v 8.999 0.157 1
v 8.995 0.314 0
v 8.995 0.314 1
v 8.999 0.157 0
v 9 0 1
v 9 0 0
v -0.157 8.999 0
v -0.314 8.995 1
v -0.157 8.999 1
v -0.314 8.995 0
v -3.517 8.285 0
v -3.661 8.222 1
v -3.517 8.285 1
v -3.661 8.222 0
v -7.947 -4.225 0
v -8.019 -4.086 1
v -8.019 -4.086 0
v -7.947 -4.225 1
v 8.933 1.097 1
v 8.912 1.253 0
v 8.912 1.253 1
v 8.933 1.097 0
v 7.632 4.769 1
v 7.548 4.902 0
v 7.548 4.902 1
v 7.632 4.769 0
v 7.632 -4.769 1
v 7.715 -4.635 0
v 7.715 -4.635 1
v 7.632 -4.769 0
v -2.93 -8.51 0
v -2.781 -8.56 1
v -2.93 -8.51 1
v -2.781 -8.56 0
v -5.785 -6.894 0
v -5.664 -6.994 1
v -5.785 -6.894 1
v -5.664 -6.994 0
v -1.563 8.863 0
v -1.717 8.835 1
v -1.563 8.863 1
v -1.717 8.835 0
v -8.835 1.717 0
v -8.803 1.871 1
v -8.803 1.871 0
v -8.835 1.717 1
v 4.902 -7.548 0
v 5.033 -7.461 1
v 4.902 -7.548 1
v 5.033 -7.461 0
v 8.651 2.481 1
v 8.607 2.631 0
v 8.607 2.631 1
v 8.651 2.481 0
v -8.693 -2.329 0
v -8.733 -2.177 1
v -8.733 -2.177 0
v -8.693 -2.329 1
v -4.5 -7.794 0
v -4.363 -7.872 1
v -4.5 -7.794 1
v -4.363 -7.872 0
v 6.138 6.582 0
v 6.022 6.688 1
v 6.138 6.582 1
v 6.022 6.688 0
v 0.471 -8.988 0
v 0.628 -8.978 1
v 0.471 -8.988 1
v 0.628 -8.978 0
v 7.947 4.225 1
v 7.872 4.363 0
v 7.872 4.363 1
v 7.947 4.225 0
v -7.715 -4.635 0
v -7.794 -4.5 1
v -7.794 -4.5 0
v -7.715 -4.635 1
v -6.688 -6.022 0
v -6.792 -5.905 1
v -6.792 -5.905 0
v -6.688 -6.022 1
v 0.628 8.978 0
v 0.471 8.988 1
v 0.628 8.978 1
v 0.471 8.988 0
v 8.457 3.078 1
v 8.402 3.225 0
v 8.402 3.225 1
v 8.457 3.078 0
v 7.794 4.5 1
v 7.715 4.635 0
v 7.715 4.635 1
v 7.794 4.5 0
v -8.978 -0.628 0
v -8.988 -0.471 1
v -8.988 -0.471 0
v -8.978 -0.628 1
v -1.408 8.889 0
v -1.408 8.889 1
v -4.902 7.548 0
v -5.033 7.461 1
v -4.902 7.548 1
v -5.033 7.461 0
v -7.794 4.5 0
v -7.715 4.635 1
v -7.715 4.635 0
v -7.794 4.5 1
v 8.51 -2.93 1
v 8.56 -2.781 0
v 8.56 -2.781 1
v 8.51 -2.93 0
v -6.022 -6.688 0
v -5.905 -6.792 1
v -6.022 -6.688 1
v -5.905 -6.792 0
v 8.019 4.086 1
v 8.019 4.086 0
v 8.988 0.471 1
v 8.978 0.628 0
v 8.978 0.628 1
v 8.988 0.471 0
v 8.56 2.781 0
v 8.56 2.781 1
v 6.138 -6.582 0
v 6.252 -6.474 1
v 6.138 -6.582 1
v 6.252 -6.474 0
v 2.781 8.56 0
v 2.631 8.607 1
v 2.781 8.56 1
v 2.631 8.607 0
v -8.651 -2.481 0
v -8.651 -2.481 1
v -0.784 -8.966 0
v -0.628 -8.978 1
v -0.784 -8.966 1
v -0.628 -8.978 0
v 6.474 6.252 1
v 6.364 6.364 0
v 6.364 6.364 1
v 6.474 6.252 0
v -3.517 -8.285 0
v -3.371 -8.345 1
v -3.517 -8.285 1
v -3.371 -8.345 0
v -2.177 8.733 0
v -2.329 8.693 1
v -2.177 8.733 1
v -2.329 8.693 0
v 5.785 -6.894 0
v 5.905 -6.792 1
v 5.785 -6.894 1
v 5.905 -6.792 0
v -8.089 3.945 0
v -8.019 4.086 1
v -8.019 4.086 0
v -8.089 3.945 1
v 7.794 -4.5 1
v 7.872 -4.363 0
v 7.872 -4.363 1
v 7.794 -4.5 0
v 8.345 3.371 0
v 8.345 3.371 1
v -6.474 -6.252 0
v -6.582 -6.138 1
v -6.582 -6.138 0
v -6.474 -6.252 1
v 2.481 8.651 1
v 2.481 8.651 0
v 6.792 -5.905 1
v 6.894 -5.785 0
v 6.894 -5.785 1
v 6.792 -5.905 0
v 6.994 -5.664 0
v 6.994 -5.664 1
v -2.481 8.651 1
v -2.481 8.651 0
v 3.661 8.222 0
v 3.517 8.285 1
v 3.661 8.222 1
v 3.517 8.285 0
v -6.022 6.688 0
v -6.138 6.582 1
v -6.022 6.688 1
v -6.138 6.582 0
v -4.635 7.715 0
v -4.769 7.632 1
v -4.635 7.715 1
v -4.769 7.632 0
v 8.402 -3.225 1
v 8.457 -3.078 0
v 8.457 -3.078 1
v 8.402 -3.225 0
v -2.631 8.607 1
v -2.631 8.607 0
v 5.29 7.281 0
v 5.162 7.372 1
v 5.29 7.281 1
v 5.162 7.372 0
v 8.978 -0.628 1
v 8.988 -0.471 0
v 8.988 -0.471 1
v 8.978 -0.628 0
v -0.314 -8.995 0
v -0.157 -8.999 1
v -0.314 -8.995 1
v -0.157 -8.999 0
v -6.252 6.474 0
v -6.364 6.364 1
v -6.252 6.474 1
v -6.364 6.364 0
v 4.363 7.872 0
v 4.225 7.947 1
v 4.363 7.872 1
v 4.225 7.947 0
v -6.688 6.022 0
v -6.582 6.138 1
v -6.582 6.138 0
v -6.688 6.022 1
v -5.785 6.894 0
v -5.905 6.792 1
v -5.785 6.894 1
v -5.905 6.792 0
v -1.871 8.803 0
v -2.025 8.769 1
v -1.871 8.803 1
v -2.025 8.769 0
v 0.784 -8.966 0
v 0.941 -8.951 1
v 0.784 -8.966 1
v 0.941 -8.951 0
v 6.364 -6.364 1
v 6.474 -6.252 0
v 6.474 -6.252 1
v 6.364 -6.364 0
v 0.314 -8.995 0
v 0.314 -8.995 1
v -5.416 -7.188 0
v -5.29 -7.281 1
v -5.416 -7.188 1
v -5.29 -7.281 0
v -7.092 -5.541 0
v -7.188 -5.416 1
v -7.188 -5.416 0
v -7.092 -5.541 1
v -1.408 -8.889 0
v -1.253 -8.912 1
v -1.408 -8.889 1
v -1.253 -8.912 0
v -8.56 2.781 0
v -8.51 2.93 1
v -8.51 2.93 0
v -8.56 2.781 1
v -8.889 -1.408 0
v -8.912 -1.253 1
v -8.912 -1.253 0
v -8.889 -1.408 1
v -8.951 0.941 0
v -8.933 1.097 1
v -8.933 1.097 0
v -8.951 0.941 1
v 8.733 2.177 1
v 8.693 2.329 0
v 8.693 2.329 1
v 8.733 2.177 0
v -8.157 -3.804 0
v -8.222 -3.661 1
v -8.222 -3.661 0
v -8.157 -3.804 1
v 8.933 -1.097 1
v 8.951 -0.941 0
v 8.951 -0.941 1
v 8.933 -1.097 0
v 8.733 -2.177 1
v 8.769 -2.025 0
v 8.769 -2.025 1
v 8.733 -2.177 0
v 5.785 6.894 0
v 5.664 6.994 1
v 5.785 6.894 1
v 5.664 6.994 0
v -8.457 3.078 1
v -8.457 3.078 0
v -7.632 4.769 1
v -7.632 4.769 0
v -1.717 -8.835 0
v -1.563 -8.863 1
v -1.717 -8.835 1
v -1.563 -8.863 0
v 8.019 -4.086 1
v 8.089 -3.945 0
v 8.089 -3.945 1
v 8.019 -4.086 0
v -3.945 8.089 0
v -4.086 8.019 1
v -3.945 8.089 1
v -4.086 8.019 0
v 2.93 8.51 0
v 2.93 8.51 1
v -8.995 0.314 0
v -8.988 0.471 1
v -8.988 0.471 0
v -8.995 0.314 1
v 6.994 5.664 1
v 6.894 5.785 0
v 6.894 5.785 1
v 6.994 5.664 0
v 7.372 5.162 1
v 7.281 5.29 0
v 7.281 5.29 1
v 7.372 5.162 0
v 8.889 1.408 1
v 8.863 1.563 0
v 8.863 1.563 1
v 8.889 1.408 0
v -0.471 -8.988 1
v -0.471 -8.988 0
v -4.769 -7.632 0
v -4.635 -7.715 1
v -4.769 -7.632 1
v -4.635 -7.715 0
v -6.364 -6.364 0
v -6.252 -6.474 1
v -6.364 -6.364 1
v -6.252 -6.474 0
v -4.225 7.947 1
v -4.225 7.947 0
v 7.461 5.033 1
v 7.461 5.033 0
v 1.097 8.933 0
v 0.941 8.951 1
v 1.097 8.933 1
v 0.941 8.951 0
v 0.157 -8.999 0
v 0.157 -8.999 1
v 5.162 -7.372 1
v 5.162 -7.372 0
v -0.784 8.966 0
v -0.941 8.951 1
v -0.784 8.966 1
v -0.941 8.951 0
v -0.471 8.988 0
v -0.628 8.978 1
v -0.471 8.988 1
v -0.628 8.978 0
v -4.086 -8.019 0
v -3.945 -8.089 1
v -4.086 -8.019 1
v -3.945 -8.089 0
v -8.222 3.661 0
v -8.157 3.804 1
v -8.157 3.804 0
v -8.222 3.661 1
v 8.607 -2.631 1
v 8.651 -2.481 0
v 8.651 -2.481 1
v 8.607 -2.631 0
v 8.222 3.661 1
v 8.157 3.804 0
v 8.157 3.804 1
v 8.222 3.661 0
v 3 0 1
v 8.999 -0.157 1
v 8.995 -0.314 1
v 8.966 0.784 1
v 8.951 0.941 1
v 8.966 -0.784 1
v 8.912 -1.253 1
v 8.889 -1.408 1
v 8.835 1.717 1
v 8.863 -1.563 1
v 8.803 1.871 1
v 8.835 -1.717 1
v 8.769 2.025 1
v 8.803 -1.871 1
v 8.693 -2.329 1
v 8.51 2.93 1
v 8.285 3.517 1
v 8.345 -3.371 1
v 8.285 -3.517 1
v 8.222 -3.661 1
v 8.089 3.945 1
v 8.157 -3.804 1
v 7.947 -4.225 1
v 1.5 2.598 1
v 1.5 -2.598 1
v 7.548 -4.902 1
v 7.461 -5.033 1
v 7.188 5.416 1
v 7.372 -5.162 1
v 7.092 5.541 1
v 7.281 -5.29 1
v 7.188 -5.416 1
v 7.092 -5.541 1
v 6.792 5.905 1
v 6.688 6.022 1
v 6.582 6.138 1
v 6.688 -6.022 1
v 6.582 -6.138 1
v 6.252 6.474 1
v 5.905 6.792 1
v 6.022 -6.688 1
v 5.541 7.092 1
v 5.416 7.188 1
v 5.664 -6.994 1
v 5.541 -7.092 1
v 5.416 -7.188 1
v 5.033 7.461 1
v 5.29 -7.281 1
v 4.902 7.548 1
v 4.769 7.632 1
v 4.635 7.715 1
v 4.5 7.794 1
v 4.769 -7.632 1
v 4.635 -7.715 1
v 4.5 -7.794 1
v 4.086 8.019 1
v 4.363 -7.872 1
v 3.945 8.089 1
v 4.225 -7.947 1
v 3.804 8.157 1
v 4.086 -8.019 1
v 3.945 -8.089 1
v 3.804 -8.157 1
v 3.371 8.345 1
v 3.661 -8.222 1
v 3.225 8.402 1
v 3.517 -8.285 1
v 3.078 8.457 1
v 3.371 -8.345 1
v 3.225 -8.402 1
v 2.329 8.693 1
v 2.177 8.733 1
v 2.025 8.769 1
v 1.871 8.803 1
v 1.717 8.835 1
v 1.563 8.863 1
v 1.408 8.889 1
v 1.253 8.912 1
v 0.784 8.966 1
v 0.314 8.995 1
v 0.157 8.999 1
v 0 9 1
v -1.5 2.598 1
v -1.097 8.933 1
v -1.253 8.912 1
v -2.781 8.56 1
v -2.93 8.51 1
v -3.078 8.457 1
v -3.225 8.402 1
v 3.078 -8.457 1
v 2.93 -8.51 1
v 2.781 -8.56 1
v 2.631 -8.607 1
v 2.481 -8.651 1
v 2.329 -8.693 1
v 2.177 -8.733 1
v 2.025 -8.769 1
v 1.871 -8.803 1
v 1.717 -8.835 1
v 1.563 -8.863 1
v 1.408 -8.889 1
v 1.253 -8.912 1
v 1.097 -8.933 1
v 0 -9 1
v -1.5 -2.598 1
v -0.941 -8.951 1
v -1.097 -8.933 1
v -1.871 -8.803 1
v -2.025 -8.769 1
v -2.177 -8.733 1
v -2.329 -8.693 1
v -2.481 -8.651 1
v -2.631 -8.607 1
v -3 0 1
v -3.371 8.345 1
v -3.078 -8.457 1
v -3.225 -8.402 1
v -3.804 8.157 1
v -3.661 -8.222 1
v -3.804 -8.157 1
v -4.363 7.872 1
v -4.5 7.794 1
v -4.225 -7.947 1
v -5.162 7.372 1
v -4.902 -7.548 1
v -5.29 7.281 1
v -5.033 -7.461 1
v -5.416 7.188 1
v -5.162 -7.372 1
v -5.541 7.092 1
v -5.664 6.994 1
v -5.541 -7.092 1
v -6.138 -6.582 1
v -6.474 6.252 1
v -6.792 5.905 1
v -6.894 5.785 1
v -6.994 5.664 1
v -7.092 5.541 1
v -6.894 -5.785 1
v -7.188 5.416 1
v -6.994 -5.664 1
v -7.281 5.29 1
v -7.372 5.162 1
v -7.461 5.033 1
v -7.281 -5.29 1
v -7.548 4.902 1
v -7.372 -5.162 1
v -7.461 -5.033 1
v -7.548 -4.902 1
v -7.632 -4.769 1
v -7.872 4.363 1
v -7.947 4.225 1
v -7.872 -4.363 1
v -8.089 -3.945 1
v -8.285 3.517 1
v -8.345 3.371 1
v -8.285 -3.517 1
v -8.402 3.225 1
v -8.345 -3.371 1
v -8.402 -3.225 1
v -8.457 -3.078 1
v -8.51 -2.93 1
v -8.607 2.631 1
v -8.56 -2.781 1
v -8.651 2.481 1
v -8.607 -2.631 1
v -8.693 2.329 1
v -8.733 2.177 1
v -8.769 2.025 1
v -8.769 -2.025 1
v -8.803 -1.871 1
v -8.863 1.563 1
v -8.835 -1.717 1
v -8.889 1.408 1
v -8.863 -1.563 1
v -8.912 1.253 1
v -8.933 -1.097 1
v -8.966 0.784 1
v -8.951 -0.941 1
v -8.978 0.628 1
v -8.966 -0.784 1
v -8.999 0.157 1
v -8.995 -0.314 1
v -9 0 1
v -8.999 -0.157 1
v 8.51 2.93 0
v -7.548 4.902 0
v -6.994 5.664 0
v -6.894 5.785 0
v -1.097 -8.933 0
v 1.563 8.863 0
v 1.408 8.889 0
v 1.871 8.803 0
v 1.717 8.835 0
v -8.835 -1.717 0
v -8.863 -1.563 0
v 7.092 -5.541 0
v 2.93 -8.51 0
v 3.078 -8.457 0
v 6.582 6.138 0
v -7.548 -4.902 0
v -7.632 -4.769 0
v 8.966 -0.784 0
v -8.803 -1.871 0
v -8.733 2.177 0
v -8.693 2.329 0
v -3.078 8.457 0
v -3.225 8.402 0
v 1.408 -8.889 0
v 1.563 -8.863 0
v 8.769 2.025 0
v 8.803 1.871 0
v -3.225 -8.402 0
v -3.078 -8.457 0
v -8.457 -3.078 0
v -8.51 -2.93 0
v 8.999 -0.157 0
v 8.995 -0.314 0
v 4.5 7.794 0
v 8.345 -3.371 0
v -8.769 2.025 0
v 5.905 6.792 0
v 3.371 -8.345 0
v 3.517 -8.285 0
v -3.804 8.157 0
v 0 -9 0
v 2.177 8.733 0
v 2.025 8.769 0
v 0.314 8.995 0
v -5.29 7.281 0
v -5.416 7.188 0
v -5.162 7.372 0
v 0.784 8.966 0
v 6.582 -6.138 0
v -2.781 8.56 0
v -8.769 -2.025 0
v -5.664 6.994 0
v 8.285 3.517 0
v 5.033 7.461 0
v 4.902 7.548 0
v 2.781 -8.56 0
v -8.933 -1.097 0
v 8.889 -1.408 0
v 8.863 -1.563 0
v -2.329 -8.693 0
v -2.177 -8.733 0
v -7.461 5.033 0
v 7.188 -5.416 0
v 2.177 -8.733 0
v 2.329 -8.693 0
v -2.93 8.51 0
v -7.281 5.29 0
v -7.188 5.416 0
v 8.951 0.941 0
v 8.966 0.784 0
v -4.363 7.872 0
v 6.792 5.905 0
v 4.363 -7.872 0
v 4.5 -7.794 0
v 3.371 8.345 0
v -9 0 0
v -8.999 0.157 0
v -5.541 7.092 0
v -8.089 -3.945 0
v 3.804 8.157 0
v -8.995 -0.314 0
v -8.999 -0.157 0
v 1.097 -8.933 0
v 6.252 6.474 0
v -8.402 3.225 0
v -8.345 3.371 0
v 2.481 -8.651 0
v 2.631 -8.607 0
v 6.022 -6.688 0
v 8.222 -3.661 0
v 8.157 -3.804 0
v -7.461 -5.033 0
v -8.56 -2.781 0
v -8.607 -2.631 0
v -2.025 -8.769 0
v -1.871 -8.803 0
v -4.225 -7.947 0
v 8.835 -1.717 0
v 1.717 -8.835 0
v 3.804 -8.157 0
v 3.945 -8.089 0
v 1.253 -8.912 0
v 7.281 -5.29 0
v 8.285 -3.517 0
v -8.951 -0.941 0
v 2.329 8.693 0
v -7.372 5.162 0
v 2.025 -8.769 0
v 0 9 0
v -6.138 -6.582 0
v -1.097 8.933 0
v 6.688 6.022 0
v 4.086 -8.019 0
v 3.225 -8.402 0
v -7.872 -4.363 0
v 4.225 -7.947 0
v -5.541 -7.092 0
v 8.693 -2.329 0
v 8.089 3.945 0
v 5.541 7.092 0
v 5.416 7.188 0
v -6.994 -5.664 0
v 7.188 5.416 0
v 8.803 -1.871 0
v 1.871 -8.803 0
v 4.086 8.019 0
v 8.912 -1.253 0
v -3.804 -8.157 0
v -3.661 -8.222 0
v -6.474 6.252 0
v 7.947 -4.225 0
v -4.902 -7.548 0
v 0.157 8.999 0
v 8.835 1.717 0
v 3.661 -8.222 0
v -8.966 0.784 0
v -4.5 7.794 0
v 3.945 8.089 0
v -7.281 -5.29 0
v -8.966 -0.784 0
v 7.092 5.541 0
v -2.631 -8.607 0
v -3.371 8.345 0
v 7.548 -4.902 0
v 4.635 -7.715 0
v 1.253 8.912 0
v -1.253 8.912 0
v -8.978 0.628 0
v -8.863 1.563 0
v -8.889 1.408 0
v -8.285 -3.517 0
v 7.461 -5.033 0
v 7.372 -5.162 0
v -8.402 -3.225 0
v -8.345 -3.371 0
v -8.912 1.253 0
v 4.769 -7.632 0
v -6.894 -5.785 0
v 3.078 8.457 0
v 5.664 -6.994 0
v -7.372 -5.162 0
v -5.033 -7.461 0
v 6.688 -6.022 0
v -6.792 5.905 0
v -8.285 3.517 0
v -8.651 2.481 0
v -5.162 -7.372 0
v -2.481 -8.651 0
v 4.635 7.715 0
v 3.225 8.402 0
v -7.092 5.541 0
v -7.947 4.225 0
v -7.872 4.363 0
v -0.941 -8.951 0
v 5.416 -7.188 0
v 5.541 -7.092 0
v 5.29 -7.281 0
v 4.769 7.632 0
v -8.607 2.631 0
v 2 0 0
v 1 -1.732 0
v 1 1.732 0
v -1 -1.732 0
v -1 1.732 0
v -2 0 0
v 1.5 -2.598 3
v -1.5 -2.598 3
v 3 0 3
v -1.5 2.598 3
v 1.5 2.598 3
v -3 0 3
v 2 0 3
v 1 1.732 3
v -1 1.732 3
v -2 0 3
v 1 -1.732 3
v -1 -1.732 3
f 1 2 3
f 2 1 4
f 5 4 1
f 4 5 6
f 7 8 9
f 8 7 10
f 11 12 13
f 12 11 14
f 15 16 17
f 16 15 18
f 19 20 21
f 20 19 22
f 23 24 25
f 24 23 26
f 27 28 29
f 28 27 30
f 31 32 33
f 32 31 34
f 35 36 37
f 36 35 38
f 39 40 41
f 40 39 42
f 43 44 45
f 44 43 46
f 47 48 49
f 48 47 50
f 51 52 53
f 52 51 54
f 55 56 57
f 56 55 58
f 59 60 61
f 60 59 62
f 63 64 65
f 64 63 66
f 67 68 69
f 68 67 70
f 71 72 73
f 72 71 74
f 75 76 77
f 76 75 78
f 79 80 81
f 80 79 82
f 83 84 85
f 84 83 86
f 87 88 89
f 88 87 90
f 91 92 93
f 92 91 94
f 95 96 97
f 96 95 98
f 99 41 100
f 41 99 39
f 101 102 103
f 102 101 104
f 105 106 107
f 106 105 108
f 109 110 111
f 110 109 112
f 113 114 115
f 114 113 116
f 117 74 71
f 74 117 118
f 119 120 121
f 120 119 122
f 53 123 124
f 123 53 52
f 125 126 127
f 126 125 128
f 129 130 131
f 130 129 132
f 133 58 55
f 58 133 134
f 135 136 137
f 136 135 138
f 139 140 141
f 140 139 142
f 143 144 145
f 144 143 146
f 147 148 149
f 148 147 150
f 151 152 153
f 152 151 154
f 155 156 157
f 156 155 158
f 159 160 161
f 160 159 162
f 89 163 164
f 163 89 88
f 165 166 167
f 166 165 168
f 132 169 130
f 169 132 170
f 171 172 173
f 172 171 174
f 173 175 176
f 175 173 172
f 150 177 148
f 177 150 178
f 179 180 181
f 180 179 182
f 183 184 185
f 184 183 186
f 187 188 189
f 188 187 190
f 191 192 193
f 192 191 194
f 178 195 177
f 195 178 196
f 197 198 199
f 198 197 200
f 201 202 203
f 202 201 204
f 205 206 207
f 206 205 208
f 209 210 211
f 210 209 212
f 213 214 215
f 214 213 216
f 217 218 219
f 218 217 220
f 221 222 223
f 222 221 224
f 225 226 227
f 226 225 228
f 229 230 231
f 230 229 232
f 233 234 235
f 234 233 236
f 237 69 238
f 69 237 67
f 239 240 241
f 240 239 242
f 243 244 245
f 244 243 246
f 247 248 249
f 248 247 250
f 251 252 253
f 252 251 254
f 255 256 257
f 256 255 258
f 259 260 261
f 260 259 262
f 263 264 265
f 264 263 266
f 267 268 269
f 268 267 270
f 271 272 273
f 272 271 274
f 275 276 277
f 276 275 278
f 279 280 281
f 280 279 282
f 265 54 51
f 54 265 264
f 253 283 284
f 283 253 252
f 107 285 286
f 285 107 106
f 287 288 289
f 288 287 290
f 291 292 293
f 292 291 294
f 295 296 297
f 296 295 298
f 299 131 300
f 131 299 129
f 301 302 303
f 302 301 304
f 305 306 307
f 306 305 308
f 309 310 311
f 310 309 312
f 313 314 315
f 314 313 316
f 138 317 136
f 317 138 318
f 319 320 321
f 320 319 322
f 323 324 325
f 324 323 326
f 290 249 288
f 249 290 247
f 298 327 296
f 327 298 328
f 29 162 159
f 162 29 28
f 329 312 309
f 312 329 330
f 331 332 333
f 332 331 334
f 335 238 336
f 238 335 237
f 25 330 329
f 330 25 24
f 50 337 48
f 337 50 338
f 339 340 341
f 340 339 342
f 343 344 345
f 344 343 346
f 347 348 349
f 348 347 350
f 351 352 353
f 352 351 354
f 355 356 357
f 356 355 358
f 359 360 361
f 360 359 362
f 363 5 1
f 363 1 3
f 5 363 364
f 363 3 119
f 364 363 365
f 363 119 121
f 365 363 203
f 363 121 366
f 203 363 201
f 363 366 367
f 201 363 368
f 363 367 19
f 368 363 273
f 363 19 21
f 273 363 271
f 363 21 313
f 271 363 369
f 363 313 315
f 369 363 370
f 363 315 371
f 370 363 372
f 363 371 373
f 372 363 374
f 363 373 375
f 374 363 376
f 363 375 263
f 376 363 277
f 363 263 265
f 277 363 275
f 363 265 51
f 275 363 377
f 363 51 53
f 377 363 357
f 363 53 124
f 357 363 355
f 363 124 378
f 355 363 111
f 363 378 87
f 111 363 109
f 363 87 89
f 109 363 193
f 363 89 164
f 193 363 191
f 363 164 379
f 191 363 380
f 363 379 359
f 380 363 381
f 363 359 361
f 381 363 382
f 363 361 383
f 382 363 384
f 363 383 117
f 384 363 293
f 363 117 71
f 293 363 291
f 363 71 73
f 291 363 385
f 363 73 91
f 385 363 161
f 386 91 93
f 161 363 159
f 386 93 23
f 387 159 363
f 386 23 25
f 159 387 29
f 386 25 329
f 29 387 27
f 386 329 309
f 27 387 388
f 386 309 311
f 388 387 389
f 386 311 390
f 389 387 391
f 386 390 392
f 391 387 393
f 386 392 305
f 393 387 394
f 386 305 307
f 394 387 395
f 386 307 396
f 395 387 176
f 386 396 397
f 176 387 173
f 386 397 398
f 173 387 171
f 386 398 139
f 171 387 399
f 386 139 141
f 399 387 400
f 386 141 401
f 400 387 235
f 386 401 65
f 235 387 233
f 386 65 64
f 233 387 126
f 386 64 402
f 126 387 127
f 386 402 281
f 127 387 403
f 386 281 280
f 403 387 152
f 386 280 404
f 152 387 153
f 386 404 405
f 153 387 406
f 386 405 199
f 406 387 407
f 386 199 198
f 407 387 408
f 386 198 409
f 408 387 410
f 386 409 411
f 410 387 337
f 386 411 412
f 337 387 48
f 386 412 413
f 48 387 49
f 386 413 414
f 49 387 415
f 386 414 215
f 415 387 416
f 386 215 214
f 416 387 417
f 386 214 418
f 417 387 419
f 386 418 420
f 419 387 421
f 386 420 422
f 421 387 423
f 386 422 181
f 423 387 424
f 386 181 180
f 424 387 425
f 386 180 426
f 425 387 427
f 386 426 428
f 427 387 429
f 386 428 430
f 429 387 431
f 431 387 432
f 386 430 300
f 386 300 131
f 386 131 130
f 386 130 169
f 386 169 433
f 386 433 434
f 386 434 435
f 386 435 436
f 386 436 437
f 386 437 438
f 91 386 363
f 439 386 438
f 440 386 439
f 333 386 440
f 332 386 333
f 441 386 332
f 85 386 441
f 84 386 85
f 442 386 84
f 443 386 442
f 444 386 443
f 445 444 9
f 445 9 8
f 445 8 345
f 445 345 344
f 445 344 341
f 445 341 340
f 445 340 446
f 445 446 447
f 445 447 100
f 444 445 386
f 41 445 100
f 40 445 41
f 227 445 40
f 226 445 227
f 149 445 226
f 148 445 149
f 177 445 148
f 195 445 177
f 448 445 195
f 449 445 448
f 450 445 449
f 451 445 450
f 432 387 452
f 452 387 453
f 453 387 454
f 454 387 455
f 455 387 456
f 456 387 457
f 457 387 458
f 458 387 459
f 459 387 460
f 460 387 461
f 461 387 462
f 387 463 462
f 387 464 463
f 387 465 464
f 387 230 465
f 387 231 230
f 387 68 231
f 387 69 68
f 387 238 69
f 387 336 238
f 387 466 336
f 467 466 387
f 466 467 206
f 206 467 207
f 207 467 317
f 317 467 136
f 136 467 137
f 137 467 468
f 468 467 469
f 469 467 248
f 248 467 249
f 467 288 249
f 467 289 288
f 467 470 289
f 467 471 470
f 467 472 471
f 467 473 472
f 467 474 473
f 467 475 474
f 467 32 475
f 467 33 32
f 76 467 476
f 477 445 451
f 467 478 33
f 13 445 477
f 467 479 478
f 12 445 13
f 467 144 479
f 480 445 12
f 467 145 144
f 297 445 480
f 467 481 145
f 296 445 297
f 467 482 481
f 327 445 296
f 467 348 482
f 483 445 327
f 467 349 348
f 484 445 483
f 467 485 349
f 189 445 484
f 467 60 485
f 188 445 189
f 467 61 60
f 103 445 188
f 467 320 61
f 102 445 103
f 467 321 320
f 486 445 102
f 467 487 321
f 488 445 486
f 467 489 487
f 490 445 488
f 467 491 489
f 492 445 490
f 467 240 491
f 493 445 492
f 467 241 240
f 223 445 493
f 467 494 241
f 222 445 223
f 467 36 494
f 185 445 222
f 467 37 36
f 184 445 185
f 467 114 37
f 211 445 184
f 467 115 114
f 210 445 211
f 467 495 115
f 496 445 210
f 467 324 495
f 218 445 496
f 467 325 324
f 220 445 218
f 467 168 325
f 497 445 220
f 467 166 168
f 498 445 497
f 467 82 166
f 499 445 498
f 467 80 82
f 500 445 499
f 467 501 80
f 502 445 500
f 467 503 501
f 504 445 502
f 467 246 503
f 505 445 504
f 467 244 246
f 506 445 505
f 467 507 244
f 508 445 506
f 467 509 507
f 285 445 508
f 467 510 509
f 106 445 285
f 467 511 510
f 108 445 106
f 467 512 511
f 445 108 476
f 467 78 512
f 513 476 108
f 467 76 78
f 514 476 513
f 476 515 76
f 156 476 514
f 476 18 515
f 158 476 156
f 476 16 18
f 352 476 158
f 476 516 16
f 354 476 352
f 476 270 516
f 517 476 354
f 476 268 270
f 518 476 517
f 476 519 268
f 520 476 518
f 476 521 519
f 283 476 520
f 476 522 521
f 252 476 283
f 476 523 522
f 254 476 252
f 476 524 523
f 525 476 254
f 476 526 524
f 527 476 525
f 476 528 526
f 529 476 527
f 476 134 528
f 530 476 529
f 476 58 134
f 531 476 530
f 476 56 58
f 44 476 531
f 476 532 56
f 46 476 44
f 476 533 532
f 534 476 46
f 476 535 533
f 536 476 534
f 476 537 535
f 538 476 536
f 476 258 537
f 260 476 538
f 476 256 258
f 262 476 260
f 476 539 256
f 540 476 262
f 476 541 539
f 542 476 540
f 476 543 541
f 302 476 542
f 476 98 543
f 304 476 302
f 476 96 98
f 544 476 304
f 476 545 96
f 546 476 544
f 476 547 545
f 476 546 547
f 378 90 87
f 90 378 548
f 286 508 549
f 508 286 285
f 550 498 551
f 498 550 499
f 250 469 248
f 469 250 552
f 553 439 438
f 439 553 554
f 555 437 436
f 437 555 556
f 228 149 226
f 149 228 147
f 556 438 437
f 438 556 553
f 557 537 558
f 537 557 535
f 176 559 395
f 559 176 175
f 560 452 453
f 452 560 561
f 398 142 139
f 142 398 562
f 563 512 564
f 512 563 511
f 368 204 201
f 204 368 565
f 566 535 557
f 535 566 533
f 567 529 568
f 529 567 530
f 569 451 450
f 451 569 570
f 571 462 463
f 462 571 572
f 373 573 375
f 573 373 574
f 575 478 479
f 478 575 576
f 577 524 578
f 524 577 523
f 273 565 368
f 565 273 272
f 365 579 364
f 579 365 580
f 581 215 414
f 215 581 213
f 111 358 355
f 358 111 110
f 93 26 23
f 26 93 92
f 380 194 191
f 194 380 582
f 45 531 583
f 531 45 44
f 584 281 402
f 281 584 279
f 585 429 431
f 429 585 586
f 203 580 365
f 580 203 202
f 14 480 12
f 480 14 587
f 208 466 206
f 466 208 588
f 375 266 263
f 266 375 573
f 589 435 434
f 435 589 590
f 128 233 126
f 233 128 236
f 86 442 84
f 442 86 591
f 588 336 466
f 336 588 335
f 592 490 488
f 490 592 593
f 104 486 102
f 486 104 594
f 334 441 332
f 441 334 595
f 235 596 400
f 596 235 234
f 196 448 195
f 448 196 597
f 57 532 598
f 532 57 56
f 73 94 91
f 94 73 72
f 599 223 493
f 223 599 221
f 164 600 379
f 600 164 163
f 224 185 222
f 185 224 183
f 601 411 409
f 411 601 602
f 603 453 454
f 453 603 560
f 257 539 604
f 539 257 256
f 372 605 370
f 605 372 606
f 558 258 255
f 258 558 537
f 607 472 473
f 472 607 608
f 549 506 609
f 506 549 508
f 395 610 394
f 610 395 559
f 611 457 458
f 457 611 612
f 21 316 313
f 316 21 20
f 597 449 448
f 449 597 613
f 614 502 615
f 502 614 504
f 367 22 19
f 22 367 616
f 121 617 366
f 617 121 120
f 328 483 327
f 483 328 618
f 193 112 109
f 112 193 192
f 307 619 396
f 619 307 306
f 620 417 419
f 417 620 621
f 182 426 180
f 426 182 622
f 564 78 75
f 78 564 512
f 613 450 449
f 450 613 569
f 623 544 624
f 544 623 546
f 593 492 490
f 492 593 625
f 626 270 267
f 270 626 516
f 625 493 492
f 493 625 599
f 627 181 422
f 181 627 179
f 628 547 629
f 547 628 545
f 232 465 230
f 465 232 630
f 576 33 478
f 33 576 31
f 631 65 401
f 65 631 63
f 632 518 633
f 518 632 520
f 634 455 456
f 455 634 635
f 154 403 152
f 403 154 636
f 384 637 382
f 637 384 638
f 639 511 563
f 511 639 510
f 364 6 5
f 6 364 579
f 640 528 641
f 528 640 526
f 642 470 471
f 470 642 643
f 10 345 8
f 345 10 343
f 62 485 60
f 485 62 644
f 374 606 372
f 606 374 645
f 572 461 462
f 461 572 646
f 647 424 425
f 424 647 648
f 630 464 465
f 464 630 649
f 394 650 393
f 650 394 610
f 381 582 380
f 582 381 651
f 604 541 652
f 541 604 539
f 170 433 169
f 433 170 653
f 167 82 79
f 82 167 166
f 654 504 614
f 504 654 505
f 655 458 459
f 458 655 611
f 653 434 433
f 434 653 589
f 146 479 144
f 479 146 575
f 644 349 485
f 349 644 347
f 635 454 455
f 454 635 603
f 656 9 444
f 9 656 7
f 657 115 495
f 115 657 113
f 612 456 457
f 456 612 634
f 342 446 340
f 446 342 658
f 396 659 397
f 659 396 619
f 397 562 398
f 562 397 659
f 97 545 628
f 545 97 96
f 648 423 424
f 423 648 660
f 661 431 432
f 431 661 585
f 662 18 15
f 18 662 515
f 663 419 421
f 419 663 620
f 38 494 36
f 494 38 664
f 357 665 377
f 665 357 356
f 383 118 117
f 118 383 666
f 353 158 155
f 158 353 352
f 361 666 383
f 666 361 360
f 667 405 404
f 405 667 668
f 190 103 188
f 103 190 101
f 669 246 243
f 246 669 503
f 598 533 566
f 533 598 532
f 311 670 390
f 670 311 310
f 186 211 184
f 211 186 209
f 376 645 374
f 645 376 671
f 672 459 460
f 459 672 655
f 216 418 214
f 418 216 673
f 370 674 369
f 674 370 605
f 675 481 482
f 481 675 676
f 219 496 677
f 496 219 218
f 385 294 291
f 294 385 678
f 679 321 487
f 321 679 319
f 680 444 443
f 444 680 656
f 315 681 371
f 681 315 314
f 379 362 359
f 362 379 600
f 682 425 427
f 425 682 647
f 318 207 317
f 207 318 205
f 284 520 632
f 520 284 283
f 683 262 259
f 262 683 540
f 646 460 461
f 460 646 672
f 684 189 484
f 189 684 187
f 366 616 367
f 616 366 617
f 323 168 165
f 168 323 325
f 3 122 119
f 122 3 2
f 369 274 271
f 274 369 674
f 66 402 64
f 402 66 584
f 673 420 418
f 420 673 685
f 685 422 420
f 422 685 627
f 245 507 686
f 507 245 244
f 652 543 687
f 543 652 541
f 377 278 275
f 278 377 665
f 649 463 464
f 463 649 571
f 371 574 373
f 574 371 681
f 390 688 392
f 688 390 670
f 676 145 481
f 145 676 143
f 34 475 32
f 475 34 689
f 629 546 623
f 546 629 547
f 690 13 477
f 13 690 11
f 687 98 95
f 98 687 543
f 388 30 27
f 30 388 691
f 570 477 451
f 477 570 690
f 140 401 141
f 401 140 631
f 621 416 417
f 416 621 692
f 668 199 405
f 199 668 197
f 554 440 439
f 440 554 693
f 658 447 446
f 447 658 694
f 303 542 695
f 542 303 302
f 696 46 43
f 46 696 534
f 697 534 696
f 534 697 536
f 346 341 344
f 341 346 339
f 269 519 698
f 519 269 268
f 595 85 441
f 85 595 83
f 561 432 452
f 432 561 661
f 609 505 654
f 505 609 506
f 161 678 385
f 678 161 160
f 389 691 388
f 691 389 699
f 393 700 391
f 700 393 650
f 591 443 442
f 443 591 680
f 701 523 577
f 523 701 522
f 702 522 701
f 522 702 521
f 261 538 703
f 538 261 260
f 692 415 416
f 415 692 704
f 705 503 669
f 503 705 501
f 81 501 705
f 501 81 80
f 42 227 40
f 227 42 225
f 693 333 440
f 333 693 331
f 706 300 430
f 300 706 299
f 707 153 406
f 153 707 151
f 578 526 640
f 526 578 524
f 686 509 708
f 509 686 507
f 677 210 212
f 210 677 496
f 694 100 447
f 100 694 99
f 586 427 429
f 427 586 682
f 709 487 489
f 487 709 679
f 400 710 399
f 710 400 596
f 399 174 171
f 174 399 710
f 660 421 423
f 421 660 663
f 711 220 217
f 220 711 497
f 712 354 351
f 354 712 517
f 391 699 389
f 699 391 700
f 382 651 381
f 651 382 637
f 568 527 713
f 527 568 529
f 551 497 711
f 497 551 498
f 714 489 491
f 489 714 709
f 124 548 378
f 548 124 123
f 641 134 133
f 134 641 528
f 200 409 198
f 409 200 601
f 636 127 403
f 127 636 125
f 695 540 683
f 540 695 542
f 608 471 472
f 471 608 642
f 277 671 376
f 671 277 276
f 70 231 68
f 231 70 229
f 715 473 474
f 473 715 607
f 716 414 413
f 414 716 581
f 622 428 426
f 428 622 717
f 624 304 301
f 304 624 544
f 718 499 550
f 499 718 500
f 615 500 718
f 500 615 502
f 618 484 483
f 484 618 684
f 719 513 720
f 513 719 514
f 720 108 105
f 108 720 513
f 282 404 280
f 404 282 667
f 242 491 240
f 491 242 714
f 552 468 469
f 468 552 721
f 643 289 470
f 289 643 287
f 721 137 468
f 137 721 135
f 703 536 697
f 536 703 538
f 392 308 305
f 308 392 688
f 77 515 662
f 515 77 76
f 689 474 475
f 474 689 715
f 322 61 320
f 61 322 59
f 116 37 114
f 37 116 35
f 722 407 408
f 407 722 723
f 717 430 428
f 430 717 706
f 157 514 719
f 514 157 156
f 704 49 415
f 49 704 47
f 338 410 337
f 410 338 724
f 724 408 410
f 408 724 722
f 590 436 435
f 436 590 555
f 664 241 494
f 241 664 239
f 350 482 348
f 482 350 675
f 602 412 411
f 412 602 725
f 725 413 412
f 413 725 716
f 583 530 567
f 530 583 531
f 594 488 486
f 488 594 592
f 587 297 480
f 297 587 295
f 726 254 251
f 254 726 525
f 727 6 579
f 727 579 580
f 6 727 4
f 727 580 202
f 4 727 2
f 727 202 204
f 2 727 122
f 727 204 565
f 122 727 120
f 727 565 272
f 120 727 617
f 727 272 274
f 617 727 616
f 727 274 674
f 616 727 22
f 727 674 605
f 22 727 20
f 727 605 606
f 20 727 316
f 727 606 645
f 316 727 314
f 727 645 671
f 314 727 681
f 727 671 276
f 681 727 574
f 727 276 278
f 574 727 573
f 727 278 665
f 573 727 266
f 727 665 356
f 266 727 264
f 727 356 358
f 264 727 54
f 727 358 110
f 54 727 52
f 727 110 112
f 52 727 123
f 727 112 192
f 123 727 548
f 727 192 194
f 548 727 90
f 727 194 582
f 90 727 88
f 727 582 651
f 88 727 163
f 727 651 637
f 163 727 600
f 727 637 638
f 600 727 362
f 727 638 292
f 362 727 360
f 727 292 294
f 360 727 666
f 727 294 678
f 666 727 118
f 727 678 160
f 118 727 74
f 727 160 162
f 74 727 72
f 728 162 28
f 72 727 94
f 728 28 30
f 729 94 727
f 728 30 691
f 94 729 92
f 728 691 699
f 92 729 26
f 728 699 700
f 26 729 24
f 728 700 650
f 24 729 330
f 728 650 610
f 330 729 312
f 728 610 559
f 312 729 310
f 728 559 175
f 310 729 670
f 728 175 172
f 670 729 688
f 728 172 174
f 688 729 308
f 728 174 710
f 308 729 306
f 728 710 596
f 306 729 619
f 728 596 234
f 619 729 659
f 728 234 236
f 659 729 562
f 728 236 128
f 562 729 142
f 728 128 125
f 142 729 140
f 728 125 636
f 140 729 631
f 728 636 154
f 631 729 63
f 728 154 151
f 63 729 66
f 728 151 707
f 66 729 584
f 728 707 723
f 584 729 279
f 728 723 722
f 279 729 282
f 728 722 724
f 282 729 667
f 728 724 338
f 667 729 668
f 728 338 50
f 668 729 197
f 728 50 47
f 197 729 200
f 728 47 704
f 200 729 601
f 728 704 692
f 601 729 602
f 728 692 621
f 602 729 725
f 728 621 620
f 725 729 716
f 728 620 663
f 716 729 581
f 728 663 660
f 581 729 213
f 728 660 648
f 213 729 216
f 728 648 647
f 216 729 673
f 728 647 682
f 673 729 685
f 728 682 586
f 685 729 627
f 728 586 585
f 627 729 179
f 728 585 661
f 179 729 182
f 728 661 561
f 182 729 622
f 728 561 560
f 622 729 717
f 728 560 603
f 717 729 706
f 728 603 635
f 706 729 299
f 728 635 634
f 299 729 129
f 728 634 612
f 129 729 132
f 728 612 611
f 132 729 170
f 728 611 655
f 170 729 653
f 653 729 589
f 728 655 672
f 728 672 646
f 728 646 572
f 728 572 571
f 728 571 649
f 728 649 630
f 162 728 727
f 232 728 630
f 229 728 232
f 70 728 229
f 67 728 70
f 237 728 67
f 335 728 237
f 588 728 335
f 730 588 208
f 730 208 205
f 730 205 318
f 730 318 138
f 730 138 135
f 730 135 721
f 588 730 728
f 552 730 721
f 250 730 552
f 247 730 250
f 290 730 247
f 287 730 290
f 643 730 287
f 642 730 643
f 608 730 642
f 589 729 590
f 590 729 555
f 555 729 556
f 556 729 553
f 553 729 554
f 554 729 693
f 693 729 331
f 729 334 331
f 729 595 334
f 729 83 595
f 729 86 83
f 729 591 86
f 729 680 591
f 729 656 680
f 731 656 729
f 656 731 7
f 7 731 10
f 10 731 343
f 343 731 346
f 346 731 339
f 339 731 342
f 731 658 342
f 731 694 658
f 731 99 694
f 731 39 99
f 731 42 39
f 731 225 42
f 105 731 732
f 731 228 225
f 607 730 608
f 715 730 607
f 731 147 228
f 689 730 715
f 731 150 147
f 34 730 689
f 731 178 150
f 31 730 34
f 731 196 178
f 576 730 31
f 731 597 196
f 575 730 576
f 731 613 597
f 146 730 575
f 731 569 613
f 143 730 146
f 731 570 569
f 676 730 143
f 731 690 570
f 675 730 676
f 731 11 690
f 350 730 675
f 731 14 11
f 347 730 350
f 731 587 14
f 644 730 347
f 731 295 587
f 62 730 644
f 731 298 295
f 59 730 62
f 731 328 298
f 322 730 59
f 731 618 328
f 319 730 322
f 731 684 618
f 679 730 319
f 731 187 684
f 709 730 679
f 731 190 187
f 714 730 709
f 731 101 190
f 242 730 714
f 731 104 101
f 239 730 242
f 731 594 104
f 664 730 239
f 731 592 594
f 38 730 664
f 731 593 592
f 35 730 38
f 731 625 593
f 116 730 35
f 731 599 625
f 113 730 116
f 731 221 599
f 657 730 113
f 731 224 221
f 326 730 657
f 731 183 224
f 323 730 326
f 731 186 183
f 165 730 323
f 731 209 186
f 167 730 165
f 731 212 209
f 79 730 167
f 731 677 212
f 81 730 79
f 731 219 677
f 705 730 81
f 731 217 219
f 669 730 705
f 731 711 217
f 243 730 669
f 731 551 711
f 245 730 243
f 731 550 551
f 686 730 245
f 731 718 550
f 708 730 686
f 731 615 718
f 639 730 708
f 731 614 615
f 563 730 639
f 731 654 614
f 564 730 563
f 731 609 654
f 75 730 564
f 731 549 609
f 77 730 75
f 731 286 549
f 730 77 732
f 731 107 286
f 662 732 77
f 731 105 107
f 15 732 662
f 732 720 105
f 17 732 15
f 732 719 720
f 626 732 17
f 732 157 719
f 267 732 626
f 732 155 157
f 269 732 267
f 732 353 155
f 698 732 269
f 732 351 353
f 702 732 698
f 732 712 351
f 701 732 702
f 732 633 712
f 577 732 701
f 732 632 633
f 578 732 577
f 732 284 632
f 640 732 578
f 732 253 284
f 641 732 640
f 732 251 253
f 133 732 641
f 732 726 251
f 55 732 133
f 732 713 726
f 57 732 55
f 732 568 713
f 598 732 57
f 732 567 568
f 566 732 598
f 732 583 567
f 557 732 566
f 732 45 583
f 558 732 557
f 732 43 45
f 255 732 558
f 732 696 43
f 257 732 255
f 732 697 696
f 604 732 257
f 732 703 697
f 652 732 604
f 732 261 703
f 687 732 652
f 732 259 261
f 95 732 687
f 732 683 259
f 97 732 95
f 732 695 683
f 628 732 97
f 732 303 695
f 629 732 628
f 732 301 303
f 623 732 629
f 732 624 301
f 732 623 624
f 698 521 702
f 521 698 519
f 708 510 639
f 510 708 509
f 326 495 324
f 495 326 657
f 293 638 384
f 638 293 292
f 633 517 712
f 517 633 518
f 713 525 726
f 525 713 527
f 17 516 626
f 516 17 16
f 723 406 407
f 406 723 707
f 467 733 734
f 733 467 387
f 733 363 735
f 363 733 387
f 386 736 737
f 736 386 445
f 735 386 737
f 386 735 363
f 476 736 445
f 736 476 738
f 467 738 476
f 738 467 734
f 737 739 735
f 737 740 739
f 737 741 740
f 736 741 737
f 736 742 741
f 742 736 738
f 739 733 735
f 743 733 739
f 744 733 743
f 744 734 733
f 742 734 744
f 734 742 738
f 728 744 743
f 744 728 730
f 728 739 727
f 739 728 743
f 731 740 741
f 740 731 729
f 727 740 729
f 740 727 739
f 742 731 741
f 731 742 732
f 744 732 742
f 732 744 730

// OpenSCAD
// Hola mundo openSCAD

/*
comentarios
*/

$fs = 0.1; // tamaño minimo
$fa = 1; // angulo minimo

difference() {
    union() {
        cylinder(1,9,9);
        cylinder(3,3,3,$fn=6);
    }
    translate([0,0,-1]) cylinder(5,2,2,$fn=6);
}
